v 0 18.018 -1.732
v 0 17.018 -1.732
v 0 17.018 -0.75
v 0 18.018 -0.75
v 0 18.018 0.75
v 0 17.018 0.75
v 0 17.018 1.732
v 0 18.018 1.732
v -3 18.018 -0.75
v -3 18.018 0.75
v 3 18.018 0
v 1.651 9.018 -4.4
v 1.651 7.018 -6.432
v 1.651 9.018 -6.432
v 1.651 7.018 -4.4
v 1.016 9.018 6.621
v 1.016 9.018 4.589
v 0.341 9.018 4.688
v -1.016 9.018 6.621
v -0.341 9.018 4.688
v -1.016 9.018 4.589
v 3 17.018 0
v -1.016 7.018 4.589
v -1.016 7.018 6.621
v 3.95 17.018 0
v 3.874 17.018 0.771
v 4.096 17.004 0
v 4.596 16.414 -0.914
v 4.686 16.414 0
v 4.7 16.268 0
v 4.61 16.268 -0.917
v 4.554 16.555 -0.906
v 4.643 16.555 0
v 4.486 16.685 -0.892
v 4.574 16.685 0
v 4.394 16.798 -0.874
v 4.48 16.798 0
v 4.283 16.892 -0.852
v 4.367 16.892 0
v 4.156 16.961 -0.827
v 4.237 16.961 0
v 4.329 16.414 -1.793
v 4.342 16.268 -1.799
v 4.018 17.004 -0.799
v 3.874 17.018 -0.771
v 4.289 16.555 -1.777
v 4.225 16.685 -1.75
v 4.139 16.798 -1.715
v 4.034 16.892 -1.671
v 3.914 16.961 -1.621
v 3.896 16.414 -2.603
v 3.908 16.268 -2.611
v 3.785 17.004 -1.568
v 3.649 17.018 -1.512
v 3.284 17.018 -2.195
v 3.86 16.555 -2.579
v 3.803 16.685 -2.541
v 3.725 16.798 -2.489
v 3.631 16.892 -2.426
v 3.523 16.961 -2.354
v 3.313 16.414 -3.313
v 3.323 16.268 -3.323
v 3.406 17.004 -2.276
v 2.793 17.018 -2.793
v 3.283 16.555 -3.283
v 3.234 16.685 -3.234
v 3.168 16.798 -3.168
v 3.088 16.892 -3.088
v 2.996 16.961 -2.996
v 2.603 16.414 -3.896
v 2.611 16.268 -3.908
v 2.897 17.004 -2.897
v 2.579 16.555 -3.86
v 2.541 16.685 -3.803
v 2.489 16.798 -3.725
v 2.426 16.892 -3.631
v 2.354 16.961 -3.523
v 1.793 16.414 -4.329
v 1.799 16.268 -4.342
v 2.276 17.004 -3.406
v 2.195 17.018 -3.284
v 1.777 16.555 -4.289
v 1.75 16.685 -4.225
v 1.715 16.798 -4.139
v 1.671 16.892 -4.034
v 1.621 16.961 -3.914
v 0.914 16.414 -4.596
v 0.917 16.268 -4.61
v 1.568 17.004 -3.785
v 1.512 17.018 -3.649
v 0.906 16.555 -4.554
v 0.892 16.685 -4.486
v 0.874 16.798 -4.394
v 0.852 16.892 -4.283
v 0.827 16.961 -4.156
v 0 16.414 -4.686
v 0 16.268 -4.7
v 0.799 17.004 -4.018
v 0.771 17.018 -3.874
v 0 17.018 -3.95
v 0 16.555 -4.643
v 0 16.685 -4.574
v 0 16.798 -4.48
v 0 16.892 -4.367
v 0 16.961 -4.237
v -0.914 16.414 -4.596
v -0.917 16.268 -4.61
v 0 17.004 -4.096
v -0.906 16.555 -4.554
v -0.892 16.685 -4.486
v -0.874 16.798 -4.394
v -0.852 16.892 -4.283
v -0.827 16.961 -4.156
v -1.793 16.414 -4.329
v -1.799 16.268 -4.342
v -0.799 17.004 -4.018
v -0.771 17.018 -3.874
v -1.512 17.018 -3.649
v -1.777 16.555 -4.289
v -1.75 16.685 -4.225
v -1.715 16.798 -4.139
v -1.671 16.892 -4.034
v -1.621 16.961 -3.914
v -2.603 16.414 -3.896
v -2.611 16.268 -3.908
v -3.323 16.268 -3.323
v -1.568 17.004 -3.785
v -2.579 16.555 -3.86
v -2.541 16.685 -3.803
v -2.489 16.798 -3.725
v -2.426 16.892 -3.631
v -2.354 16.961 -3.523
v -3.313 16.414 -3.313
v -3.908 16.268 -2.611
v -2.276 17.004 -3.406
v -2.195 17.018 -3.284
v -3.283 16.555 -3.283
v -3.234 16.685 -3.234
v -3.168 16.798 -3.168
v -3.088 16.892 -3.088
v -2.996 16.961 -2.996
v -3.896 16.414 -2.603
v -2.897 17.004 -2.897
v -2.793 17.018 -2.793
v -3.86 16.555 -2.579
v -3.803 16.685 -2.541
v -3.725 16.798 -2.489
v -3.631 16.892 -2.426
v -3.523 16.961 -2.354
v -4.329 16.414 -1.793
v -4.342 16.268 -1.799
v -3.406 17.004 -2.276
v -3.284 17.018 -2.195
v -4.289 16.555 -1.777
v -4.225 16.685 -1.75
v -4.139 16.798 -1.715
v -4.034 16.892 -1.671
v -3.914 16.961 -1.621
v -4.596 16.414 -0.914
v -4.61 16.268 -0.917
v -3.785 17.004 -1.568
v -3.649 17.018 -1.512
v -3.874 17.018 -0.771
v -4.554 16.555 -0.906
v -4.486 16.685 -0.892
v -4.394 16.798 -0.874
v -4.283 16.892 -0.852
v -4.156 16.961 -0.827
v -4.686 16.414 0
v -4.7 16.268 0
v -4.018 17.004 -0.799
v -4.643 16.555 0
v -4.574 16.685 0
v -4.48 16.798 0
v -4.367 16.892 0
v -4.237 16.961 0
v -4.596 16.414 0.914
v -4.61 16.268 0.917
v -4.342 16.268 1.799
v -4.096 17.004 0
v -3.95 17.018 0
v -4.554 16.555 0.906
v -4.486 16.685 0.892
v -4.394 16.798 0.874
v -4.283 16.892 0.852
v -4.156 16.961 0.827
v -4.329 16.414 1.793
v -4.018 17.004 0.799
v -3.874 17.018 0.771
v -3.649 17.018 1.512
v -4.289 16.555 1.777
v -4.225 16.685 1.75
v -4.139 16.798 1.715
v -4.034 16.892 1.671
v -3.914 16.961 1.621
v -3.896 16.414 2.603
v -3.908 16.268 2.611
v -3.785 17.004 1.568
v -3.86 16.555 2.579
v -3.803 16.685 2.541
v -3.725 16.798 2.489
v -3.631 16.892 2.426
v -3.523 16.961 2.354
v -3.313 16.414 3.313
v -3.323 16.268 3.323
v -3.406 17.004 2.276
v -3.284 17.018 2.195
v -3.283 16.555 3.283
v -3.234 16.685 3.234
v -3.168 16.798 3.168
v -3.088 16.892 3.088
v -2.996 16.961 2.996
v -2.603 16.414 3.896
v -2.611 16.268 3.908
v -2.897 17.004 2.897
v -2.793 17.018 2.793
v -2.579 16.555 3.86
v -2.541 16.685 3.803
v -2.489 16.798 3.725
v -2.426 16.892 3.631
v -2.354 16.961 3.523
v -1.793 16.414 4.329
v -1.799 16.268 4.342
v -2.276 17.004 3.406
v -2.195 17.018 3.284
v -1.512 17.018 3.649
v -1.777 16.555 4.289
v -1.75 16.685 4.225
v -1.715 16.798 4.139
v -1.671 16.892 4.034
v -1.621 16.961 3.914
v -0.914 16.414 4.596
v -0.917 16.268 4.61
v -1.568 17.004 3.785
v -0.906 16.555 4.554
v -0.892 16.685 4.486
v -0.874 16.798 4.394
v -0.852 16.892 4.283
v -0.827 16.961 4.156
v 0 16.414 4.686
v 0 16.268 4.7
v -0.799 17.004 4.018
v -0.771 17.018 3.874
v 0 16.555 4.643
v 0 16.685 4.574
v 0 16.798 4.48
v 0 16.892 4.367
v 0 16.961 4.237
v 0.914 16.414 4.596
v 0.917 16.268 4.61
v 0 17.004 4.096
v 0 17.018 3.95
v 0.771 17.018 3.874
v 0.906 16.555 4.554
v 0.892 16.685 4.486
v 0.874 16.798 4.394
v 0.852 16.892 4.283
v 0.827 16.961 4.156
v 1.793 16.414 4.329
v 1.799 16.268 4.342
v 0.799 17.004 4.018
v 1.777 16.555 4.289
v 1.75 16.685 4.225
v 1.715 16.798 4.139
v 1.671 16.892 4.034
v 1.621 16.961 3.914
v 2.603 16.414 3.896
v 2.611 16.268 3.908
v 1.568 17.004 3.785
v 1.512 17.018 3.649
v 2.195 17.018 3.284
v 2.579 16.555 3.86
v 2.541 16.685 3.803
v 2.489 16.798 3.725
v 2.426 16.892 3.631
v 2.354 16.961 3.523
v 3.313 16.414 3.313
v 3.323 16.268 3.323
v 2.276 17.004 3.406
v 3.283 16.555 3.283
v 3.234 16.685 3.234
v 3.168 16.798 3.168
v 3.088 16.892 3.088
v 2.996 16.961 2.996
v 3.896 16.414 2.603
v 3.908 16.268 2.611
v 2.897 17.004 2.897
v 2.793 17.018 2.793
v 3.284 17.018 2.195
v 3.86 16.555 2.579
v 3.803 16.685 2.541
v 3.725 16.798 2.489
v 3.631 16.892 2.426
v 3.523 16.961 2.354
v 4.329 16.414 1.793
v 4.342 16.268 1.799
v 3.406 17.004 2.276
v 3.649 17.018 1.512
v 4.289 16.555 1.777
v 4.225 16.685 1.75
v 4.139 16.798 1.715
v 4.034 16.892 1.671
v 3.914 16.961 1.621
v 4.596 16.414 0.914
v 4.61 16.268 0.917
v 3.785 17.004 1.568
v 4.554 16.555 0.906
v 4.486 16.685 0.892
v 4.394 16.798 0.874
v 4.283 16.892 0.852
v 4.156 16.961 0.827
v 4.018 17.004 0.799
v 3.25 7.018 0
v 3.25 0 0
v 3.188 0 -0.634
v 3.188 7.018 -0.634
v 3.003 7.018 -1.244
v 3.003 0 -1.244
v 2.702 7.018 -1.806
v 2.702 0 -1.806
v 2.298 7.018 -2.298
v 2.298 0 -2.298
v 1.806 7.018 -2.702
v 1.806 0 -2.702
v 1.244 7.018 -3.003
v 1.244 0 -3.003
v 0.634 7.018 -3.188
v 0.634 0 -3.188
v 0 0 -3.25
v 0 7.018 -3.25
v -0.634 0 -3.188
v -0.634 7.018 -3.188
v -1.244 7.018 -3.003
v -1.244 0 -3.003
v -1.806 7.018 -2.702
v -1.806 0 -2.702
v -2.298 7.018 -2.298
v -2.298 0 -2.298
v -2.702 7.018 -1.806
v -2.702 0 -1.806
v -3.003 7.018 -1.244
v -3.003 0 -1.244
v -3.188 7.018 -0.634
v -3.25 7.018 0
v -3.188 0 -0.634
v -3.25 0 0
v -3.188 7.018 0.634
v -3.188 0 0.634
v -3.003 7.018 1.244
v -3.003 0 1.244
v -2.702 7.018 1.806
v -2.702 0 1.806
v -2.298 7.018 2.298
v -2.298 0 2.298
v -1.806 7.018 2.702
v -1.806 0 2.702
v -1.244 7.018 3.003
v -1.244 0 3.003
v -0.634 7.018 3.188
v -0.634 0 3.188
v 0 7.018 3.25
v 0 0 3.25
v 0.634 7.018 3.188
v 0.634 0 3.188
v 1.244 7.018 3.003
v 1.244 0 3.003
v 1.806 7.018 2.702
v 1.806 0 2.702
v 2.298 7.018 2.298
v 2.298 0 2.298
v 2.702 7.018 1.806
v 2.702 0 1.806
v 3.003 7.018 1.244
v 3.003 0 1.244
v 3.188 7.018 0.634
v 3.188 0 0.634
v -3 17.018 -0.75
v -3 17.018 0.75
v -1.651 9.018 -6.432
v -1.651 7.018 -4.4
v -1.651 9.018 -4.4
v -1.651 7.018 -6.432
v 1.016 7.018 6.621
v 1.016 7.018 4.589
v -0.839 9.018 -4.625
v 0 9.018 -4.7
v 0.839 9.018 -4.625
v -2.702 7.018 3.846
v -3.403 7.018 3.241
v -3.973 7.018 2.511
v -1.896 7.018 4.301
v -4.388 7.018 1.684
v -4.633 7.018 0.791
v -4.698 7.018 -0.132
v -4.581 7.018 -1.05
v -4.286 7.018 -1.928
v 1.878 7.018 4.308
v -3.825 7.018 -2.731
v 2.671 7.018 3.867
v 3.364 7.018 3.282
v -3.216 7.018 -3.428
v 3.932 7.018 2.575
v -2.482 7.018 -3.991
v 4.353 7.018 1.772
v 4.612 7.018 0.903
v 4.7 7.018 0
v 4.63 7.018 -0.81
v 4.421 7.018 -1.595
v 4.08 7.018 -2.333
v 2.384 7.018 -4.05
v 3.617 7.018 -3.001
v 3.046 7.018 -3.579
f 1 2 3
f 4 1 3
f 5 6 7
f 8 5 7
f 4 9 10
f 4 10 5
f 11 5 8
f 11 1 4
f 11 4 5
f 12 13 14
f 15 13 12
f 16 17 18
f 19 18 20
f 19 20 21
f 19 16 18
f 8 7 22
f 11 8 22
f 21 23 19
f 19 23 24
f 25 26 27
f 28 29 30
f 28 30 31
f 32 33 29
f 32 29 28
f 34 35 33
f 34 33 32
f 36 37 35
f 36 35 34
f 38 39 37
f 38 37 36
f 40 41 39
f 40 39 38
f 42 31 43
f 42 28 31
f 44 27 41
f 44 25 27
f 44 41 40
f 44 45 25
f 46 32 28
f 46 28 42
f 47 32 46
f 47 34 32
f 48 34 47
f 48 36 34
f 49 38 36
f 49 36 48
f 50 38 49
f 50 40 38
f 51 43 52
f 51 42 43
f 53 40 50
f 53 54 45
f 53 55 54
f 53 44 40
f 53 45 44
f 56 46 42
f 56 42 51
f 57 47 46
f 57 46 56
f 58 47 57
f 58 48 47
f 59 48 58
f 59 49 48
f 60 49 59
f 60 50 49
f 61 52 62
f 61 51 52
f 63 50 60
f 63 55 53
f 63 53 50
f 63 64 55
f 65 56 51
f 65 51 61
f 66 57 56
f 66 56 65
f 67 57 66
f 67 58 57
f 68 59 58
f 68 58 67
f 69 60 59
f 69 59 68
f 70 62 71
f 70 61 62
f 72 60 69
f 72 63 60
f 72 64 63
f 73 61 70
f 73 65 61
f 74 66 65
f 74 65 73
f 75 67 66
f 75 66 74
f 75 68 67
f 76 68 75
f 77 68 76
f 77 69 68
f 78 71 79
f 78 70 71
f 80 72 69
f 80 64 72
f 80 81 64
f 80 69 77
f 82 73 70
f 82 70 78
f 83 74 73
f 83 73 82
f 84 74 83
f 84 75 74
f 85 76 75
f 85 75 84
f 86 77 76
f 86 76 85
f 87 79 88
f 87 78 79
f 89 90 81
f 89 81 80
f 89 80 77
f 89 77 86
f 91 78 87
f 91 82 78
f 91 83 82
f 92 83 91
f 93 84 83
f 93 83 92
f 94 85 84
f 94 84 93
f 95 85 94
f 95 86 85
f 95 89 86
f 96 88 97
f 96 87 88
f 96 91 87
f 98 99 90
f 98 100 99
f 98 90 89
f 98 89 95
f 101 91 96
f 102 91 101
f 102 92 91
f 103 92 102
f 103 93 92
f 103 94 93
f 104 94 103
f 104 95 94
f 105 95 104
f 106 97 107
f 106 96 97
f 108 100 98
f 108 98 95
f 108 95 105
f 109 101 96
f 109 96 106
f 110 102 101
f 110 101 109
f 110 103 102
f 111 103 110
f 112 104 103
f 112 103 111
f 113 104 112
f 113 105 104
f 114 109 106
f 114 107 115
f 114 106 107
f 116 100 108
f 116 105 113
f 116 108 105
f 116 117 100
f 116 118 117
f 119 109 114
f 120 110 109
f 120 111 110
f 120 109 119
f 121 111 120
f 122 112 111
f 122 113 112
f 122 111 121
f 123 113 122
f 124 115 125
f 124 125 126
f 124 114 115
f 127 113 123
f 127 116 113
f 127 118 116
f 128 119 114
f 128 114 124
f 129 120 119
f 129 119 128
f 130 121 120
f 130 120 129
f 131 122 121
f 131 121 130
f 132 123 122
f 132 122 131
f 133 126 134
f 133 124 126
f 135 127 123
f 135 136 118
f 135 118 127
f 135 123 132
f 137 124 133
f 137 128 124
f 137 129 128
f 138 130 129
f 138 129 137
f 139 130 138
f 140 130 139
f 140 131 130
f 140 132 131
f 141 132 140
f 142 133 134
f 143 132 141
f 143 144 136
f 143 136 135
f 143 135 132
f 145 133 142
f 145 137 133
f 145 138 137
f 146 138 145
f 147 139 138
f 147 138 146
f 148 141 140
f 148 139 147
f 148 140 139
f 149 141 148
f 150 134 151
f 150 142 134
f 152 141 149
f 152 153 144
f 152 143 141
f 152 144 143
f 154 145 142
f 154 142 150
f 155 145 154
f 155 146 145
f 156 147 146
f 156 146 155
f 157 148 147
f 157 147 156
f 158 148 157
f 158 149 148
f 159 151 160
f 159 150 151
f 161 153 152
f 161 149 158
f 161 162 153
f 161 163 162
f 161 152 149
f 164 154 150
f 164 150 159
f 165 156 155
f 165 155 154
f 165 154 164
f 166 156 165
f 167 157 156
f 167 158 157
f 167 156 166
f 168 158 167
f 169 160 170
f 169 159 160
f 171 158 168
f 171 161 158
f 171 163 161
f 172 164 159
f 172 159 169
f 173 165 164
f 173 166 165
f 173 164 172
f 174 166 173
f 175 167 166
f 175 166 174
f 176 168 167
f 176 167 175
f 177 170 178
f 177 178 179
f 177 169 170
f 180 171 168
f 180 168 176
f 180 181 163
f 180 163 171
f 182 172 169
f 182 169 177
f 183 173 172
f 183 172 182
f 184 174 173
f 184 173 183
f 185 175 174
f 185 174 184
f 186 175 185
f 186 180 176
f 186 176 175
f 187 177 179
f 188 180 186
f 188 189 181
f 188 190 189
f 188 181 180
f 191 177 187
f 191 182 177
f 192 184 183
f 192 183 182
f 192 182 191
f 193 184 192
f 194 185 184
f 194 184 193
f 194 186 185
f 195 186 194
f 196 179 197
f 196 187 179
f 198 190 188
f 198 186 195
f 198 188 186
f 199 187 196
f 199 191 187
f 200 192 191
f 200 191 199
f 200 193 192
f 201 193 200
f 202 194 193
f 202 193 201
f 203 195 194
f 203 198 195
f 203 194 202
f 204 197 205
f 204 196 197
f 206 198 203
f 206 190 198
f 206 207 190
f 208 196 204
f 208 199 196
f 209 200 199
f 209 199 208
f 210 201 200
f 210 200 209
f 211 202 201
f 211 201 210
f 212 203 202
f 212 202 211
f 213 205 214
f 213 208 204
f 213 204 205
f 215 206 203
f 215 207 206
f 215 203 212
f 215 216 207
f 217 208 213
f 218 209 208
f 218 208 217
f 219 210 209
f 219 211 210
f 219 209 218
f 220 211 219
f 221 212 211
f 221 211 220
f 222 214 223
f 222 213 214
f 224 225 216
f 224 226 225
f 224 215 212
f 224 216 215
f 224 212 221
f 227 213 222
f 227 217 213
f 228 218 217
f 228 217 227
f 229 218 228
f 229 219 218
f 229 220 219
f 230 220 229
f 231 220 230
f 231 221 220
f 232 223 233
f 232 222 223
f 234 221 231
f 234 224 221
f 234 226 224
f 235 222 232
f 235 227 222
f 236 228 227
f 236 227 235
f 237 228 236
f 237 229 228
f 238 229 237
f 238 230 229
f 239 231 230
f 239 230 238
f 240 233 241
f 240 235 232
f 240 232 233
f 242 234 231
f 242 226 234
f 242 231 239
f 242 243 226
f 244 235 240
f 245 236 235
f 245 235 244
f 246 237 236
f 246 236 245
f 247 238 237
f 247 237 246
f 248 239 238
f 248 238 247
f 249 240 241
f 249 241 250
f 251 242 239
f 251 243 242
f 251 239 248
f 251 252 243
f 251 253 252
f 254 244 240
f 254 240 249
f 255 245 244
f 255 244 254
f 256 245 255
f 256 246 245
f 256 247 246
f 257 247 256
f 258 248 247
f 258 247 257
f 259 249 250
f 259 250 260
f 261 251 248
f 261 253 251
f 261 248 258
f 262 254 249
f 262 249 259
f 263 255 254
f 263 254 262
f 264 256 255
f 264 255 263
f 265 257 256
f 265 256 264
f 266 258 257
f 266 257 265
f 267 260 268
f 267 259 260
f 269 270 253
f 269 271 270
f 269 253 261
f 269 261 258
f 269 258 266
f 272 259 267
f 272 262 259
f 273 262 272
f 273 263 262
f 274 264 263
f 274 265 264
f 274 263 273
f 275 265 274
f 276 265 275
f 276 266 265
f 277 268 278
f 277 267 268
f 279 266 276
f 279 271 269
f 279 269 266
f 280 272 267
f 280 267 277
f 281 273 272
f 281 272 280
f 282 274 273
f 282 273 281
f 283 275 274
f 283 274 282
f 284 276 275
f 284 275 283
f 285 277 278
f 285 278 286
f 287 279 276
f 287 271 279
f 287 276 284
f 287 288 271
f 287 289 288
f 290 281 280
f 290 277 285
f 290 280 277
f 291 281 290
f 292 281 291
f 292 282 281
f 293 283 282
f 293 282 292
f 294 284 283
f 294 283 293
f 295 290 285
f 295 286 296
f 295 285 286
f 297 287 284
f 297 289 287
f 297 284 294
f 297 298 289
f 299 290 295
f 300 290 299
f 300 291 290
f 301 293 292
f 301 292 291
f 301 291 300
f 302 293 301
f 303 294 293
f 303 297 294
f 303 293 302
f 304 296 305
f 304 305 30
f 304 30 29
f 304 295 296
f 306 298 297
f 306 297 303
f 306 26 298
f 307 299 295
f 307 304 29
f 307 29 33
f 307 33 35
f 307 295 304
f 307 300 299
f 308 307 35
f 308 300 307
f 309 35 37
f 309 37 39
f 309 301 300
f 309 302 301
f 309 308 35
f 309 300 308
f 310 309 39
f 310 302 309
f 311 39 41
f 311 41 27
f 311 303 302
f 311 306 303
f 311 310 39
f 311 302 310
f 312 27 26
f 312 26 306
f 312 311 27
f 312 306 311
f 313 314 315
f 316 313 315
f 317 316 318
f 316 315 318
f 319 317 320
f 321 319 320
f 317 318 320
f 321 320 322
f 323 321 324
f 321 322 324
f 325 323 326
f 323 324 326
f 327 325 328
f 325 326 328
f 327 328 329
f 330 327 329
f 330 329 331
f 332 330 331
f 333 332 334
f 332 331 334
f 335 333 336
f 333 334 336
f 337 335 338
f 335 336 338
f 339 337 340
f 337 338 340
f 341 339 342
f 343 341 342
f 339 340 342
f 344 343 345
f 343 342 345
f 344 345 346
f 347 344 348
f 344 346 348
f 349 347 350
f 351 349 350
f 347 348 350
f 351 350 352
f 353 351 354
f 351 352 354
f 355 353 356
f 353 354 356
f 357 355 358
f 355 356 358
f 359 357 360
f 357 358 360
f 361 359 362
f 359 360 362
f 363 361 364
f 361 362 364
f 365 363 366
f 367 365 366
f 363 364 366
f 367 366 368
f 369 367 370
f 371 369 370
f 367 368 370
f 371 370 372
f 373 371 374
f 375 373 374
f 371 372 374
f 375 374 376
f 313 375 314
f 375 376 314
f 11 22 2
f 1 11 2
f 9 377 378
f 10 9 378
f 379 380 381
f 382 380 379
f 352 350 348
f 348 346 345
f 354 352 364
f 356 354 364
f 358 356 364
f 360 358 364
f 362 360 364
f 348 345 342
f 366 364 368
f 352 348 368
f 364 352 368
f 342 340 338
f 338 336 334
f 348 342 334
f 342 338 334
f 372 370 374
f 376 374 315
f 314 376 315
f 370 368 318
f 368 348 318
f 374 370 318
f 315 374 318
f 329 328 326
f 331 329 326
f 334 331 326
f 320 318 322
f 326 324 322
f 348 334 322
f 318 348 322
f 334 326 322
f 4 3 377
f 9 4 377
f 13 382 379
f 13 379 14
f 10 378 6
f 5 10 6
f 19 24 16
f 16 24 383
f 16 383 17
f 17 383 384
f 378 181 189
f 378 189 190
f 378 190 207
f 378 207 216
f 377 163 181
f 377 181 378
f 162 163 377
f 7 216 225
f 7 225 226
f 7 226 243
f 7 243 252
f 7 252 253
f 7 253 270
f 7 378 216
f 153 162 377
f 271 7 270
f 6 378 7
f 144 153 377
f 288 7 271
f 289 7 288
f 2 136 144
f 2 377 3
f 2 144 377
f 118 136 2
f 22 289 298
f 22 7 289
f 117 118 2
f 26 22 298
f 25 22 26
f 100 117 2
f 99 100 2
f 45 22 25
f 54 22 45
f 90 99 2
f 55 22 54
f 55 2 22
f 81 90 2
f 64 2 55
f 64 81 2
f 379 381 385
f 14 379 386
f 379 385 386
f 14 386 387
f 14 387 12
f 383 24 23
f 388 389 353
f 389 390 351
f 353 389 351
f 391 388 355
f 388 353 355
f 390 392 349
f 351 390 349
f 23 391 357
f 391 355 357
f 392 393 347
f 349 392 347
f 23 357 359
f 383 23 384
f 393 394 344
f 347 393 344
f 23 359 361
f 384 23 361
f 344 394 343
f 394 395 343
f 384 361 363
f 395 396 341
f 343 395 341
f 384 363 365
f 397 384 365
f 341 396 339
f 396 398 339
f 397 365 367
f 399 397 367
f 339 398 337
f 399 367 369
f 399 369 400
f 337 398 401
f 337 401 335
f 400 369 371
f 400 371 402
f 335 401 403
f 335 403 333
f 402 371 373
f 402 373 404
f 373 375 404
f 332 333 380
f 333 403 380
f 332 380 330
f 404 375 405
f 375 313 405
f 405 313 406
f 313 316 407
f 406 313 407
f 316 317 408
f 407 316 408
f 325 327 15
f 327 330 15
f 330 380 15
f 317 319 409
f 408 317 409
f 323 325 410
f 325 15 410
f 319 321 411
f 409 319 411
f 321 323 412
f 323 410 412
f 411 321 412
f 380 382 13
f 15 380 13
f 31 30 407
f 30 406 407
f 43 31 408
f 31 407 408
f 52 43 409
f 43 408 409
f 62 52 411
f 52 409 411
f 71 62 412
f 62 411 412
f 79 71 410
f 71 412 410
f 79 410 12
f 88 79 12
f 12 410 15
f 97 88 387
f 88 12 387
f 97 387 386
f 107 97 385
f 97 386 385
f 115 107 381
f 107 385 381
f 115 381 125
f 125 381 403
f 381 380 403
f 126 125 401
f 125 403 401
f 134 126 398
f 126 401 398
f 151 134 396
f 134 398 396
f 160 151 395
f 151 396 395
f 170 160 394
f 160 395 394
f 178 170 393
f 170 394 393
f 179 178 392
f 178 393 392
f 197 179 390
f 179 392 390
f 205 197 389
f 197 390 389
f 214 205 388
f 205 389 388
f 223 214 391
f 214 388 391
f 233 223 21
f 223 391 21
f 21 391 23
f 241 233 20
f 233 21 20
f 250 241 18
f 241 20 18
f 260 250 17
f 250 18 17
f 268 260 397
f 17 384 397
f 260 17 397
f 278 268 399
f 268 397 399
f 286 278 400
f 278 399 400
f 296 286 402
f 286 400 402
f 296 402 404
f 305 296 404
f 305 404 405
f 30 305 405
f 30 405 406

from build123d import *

# Parameters (mm, degrees)
SKETCH1_R           = 3.25
BOSS_EXTRUDE1_DEPTH = 7.018
SKETCH6_R           = 4.7
BOSS_EXTRUDE2_DEPTH = 10
FILLET1_R           = 0.75
BOSS_EXTRUDE3_DEPTH = 1
BOSS_EXTRUDE4_DEPTH = 2


with BuildPart() as part:
    # Sketch1 → Boss-Extrude1 (new body)
    with BuildSketch(Plane(origin=(0, 0, 0), x_dir=(1, 0, 0), z_dir=(0, 1, 0))):
        Circle(SKETCH1_R)
    extrude(amount=BOSS_EXTRUDE1_DEPTH)

    # Sketch6 → Boss-Extrude2 (add)
    with BuildSketch(Plane(origin=(0, 7.018, 0), x_dir=(1, 0, 0), z_dir=(0, 1, 0))):
        Circle(SKETCH6_R)
    extrude(amount=BOSS_EXTRUDE2_DEPTH)

    # Fillet1
    fillet1_edges = [part.edges().sort_by_distance(p)[0] for p in [
        (-4.7, 17.018, 0),
    ]]
    fillet(fillet1_edges, radius=FILLET1_R)

    # Sketch8 → Boss-Extrude3 (add)
    with BuildSketch(Plane(origin=(0, 17.018, 0), x_dir=(1, 0, 0), z_dir=(0, 1, 0))):
        Polygon((0, 0.75), (-3, 0.75), (-3, -0.75), (0, -0.75), (0, -1.732050808), (3, 0), (0, 1.732050808), align=None)
    extrude(amount=BOSS_EXTRUDE3_DEPTH)

    # Sketch9 → Boss-Extrude4 (add)
    with BuildSketch(Plane.XZ.offset(-7.018)):
        with BuildLine():
            Line((-1.016, 4.588871757), (-1.016, 6.620871757))
            Line((-1.016, 6.620871757), (1.016, 6.620871757))
            Line((1.016, 6.620871757), (1.016, 4.588871757))
            ThreePointArc((1.016, 4.588871757), (0, 4.7), (-1.016, 4.588871757))
        make_face()
        with BuildLine():
            Line((-1.651, -4.400477133), (-1.651, -6.432477133))
            Line((-1.651, -6.432477133), (1.651, -6.432477133))
            Line((1.651, -6.432477133), (1.651, -4.400477133))
            ThreePointArc((1.651, -4.400477133), (0, -4.7), (-1.651, -4.400477133))
        make_face()
    extrude(amount=-BOSS_EXTRUDE4_DEPTH)


solid = part.part
